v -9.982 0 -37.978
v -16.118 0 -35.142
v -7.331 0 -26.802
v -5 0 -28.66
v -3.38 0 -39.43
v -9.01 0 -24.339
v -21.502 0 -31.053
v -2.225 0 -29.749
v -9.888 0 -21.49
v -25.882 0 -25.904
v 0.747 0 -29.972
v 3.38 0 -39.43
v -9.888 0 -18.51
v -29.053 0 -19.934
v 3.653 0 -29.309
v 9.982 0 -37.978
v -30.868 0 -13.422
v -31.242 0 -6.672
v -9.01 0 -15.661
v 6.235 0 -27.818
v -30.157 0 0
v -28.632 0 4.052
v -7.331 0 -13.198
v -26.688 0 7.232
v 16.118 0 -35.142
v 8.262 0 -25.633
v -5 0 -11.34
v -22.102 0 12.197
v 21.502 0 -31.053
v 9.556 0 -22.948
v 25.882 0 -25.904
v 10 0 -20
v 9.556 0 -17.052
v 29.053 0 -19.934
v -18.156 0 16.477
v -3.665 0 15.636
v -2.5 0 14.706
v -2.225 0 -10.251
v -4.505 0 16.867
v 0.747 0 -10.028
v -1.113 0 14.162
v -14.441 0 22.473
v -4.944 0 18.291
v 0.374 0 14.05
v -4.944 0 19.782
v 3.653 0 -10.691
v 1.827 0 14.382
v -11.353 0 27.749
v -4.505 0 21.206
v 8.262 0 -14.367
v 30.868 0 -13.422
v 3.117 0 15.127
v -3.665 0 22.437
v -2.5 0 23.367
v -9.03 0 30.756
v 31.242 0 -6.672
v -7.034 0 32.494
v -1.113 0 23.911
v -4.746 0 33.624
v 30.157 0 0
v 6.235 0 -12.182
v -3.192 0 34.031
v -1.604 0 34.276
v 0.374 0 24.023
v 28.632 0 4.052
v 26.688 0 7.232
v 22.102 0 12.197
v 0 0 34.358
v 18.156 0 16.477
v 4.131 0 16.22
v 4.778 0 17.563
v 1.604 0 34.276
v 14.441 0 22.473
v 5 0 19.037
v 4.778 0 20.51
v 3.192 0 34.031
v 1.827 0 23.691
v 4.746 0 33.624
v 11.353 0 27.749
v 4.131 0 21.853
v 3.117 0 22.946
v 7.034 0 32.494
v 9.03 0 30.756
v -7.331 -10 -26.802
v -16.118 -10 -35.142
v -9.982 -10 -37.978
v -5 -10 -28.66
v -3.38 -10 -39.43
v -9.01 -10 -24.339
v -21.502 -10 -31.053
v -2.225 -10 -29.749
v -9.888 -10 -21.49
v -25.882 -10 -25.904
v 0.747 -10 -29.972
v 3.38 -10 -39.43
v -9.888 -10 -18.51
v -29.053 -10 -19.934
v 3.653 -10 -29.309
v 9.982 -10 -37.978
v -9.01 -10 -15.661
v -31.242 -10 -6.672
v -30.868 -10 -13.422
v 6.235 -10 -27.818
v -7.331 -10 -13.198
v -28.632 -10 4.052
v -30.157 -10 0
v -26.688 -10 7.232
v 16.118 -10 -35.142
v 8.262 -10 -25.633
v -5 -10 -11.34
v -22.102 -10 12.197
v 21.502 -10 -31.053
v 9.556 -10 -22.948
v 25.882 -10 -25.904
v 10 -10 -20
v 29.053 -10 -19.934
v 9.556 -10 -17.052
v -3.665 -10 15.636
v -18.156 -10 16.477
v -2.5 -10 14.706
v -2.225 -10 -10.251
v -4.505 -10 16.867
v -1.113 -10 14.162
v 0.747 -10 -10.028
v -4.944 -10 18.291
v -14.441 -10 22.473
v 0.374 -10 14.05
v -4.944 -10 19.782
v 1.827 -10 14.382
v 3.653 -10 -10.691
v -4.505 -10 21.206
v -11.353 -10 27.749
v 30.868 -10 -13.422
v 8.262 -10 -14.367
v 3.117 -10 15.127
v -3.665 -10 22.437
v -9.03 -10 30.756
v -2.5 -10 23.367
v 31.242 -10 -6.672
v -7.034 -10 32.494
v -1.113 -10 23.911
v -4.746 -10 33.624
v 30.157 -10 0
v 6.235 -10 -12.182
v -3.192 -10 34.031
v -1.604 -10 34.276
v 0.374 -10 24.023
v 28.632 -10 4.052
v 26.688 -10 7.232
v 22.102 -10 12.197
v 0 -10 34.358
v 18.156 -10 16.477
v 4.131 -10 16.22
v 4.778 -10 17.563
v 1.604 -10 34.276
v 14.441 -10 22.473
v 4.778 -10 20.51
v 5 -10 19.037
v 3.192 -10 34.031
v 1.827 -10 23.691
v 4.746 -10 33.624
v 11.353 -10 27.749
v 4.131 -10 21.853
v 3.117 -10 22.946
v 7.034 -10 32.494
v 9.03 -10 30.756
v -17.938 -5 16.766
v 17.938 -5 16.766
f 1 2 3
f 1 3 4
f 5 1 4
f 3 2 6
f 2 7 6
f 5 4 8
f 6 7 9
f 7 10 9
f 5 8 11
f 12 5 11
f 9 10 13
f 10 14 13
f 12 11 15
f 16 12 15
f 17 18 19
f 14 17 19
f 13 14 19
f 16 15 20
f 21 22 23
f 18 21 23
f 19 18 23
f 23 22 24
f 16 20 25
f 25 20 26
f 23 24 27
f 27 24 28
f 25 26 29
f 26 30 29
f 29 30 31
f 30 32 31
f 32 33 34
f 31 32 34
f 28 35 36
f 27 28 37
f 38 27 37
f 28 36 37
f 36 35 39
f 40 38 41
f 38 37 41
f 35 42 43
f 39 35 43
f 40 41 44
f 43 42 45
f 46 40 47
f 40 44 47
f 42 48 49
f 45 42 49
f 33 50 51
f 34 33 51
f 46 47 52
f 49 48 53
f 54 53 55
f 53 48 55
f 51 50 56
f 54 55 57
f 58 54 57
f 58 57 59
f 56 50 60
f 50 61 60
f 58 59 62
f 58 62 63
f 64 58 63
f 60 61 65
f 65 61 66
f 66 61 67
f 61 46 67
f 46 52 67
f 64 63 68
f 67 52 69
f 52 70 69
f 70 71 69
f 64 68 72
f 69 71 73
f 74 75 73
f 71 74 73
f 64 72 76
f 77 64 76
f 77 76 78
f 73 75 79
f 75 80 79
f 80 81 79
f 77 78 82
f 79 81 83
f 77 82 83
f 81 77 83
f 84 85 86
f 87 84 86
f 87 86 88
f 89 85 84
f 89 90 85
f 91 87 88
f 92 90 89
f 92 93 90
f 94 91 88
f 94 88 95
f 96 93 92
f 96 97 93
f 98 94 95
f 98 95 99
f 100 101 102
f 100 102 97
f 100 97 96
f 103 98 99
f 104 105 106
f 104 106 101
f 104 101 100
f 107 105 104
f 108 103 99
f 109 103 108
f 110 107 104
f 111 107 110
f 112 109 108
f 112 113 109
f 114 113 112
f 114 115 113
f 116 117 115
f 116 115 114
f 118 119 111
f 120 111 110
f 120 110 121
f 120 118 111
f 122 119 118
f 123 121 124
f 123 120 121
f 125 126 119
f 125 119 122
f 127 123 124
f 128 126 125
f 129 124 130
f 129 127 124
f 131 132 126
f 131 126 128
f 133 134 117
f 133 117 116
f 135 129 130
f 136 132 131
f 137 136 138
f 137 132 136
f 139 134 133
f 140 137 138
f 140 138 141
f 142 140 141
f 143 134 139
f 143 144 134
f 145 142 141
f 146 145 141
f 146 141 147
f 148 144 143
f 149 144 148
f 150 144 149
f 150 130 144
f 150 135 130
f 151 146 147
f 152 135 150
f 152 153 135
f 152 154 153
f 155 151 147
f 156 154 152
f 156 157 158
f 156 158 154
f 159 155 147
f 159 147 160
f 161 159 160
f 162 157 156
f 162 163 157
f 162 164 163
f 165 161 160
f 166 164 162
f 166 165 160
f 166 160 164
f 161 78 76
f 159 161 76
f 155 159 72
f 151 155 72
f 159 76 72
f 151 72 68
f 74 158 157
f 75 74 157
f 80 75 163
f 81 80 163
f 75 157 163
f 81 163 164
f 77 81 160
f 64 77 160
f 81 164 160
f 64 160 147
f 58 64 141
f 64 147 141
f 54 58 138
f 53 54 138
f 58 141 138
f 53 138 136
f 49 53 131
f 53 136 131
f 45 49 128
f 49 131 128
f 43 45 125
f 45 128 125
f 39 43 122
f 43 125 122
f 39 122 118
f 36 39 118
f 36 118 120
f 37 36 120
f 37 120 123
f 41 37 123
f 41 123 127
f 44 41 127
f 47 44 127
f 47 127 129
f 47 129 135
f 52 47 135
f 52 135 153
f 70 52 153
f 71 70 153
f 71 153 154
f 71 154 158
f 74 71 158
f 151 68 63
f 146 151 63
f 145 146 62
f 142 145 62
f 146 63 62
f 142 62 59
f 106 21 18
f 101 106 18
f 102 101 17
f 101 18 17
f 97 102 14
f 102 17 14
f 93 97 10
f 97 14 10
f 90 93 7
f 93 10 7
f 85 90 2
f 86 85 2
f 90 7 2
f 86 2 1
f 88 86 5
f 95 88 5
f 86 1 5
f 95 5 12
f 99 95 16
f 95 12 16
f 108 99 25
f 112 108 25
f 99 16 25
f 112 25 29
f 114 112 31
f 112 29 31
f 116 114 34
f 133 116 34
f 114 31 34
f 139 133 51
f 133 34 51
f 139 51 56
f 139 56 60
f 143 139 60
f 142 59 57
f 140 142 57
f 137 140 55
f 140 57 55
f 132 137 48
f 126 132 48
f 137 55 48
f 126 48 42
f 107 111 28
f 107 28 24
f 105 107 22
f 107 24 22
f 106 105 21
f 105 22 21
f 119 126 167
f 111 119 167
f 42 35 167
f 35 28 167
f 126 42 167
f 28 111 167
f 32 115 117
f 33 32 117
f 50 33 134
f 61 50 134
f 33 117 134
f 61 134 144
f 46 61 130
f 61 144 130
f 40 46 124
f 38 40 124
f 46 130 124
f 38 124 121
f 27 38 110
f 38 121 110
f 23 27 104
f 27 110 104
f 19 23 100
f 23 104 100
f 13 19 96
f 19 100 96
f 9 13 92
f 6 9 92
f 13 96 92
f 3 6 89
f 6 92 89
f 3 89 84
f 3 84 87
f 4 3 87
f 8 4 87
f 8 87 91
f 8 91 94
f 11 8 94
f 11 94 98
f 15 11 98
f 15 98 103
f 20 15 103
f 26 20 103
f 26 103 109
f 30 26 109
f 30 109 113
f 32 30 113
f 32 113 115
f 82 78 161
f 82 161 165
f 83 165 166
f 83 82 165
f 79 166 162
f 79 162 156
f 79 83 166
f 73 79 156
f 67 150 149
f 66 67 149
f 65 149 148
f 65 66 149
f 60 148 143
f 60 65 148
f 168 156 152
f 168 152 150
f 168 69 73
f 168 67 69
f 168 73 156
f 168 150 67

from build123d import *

# Parameters (mm, degrees)
F1_DEPTH = 10
F2_R     = 10
F3_DEPTH = 25
F4_R     = 5
F5_DEPTH = 25


with BuildPart() as f1:
    # F0 (on Front) → F1 (new body)
    with BuildSketch(Plane.XZ):
        with BuildLine():
            ThreePointArc((4.7458544305, 33.6244736514), (2.4011029044, 34.1735286962), (0, 34.3579900832))
            ThreePointArc((0, 34.3579900832), (-2.4011029044, 34.1735286962), (-4.7458544305, 33.6244736514))
            add(Edge.make_bspline(
                [(-4.7458544305, 33.6244736514), (-10.9520952223, 31.6590568221), (-16.416283898, 13.4392161658), (-27.7037138128, 8.8834728939), (-30.1568813613, 0)],
                knots=[0, 0, 0, 0, 0.5039121185, 1, 1, 1, 1], degree=3))
            ThreePointArc((-30.1568813613, 0), (-24.893077801, -27.2783942003), (0, -39.6134294928))
            ThreePointArc((0, -39.6134294928), (24.893077801, -27.2783942003), (30.1568813613, 0))
            add(Edge.make_bspline(
                [(4.7458544305, 33.6244736514), (10.9520952223, 31.6590568221), (16.416283898, 13.4392161658), (27.7037138128, 8.8834728939), (30.1568813613, 0)],
                knots=[0, 0, 0, 0, 0.5039121185, 1, 1, 1, 1], degree=3))
        make_face()
    extrude(amount=F1_DEPTH)

    # F2 (on face) → F3 (cut)
    with BuildSketch(Plane.XZ.offset(10)):
        with Locations((0, -20)):
            Circle(F2_R)
    extrude(amount=-F3_DEPTH, mode=Mode.SUBTRACT)

    # F4 (on face) → F5 (cut)
    with BuildSketch(Plane.XZ.offset(10)):
        with Locations((0, 19.0365062821)):
            Circle(F4_R)
    extrude(amount=-F5_DEPTH, mode=Mode.SUBTRACT)


solid = f1.part
